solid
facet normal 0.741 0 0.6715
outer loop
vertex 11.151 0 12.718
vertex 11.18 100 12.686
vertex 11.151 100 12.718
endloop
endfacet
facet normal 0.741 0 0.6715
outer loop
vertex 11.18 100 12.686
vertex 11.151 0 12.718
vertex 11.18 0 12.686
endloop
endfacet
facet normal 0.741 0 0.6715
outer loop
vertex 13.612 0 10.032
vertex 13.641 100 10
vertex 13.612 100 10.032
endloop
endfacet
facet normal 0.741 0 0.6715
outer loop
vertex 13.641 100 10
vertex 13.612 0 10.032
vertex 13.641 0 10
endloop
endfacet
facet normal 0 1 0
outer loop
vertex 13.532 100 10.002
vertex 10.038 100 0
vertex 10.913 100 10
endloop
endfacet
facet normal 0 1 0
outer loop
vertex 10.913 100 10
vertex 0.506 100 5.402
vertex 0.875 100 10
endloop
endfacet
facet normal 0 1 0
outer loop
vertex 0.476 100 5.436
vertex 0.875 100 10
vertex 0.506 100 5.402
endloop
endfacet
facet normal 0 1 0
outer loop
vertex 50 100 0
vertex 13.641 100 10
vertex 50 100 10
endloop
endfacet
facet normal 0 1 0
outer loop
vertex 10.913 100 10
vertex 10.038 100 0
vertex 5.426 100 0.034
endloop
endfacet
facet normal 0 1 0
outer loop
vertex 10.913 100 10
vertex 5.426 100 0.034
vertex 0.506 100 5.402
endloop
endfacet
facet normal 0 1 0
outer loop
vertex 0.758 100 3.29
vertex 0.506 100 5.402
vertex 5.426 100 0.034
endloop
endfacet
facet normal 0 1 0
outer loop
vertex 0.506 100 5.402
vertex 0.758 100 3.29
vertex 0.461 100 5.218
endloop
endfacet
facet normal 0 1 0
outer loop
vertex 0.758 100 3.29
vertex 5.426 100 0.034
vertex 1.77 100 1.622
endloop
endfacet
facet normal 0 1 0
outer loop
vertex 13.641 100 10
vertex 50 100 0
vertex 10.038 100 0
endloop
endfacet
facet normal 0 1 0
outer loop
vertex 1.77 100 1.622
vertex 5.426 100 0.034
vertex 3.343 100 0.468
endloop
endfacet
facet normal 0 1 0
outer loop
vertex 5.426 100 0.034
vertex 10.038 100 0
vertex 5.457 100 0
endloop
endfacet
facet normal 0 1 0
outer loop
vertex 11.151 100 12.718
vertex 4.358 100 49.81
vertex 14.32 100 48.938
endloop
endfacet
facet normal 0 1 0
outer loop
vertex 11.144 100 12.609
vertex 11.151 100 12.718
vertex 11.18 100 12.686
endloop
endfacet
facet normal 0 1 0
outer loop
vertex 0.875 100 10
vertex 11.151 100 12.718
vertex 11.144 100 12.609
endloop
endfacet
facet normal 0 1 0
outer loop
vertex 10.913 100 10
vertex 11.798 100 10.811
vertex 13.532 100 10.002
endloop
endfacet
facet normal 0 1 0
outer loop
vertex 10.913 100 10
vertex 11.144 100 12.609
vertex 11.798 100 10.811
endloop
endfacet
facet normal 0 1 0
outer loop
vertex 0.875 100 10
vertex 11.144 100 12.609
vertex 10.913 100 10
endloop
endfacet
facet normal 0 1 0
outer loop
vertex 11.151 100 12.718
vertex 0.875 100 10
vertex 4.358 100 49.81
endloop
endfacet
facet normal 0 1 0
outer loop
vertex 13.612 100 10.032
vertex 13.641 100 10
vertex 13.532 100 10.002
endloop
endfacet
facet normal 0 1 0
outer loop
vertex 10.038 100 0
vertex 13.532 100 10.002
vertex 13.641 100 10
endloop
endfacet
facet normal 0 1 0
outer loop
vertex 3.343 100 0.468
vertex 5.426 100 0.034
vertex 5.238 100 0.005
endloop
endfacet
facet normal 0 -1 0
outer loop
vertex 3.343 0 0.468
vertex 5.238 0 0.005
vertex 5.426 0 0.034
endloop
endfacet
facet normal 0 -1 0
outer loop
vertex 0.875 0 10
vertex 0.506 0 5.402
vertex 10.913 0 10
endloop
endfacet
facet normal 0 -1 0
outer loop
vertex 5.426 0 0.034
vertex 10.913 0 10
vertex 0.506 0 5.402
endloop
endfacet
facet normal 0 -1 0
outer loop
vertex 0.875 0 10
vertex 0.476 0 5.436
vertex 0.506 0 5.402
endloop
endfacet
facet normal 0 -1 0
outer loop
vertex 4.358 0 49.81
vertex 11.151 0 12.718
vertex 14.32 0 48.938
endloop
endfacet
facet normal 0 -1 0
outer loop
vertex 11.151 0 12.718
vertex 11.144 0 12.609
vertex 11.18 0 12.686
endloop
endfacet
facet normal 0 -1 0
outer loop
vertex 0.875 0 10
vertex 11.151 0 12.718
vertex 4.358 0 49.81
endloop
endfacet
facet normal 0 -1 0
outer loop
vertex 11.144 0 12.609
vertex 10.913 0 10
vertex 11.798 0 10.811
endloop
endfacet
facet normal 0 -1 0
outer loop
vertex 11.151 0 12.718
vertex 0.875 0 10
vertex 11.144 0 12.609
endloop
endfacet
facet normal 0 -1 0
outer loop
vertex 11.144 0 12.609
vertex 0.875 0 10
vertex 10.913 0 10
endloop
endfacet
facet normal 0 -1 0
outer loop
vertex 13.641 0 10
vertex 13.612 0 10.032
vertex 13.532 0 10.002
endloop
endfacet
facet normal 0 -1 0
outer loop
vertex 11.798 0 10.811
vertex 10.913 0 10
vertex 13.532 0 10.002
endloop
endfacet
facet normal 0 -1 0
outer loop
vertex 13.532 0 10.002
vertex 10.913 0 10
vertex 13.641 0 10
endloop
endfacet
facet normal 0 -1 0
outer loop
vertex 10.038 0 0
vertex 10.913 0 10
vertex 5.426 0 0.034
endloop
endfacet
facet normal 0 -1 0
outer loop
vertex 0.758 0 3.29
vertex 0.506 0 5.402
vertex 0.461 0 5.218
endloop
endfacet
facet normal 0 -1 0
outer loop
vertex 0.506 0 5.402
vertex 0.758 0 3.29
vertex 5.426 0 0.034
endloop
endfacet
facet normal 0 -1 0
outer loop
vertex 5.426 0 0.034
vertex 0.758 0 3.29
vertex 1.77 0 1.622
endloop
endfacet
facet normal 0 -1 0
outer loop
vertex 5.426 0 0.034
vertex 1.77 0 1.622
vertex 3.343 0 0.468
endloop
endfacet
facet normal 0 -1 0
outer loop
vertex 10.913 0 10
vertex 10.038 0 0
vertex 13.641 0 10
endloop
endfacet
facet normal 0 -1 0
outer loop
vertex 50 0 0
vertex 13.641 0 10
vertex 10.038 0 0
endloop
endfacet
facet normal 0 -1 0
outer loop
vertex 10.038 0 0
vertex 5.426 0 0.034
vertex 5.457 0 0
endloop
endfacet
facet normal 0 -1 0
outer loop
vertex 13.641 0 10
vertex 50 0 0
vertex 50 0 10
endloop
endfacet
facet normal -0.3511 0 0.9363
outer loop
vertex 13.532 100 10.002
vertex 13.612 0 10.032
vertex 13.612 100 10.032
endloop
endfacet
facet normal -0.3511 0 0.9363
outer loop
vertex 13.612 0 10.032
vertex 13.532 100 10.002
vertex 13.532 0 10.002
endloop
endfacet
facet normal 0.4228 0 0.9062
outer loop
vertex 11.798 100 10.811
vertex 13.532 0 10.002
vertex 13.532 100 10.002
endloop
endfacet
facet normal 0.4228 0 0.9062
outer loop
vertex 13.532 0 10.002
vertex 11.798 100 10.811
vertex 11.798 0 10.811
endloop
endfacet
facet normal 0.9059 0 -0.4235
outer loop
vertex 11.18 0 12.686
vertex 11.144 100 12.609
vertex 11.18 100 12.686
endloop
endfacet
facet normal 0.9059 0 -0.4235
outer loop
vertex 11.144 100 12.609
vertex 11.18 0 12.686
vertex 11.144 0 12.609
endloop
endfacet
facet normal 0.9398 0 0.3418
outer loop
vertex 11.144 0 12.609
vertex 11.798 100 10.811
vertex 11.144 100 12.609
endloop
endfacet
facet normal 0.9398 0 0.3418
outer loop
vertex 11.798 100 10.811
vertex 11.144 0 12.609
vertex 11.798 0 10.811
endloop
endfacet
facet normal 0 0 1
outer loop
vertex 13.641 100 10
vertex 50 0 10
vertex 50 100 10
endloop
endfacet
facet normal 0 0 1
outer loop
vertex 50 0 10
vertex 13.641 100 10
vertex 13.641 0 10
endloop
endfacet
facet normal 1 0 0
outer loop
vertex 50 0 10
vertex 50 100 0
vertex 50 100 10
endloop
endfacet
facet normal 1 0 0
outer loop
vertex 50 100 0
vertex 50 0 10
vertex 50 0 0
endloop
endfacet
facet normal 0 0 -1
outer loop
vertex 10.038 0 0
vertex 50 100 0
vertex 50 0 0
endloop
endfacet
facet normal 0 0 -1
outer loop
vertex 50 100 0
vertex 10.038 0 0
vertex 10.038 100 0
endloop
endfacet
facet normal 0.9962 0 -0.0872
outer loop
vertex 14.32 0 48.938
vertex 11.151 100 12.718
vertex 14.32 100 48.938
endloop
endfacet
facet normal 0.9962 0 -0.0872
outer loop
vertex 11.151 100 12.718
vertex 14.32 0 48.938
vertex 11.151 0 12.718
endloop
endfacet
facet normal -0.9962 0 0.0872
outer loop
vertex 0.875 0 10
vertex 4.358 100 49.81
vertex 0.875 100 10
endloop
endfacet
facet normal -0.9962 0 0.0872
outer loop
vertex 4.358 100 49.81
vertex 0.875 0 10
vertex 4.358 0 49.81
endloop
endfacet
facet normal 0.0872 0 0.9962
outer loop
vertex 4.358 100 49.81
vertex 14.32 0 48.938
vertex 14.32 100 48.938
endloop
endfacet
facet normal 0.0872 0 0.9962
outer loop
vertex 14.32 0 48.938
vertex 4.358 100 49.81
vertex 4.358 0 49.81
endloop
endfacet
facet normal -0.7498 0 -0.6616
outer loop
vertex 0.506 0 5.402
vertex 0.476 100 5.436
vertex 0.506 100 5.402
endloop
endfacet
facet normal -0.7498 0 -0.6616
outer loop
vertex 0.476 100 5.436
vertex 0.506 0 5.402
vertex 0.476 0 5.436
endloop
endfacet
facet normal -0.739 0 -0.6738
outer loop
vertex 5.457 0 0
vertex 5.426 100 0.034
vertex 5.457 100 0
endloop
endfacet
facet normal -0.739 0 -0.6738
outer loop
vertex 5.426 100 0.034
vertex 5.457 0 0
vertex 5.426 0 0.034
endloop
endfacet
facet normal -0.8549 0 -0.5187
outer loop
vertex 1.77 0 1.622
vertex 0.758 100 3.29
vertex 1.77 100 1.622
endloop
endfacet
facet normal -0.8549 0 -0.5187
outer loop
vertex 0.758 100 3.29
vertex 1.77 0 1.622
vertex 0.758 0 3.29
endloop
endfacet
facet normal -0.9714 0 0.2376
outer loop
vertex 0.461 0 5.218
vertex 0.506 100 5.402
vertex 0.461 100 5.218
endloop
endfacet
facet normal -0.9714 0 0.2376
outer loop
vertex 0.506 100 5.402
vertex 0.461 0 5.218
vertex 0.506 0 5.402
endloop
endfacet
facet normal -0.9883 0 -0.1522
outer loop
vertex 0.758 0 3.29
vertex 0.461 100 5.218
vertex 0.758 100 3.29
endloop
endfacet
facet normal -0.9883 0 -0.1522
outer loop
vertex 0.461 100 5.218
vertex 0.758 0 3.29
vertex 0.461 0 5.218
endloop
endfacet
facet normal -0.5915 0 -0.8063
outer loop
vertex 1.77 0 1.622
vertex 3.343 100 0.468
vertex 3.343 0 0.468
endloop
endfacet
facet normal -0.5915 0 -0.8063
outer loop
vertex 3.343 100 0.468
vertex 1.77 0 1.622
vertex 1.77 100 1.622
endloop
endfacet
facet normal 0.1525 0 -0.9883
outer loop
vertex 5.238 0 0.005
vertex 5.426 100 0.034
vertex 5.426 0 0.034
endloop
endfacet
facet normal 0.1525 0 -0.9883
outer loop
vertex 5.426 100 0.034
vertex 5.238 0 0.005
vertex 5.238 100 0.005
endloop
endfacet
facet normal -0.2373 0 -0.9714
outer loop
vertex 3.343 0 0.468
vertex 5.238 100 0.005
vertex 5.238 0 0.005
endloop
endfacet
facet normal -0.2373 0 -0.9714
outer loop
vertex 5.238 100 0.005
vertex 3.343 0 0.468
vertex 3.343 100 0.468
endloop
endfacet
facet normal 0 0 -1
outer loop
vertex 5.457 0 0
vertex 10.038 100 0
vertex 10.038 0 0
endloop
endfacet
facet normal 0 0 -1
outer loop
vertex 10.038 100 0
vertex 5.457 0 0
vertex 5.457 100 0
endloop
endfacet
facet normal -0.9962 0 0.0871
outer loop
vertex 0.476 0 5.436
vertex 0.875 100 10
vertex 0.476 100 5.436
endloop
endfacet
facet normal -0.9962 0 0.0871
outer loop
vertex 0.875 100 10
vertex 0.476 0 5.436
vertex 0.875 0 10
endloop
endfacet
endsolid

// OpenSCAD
function join_width(width, angle) =
    let (half_angle = angle / 2)
    let (x_cut = width / cos(half_angle))
    x_cut / tan(half_angle);


module angled_plate_round_corner(diameter=5, angle=45, length=100) {
    radius = diameter / 2;
    half_angle = angle / 2;
    x_width = cos(half_angle) * diameter;
    y_height = (x_width / 2) / tan(half_angle);
    y_cylinder_offset = sin(half_angle) * radius;
    translate([0, 0, -y_height]) {
        difference() {
            translate([-x_width/2, 0, 0]) {
                cube([x_width, length, y_height]);
            }
            translate([0, -5, -y_cylinder_offset]) {
                rotate([-90, 0, 0]){
                    cylinder(length + 10, radius, radius);
                }
            }
        }
    }
}


module angled_plates_helper(length=100, height=50, width=10, angle=85, corner_diameter=5) {
    half_angle = angle / 2;
    z_offset = join_width(width, angle);
    union() {
        rotate([0, half_angle, 0]) {
            translate([-0, 0, -height]) {
                cube ([width, length, height]);
            }
        }
        rotate([0, -half_angle, 0]) {
            translate([-width, 0, -height]) {
                cube ([width, length, height]);
            }
        }
        translate([0,0, -z_offset]) {
            angled_plate_round_corner(corner_diameter, angle, length);
        }
    }
}

module angled_plates(length=100, height=50, width=10, angle=85, outer_diameter=10, inner_diameter=5) {
    half_angle = angle/2;
    z_offset = join_width(width, angle);
    rotate([0 ,-half_angle-90, 0]) {
        union() {
            difference () {
                angled_plates_helper(length, height, width, angle, inner_diameter);
                translate([0, -1, z_offset]) {
                    angled_plates_helper(length+2, height, width, angle, outer_diameter);
                }
            }
        }
    }
}

angled_plates();
